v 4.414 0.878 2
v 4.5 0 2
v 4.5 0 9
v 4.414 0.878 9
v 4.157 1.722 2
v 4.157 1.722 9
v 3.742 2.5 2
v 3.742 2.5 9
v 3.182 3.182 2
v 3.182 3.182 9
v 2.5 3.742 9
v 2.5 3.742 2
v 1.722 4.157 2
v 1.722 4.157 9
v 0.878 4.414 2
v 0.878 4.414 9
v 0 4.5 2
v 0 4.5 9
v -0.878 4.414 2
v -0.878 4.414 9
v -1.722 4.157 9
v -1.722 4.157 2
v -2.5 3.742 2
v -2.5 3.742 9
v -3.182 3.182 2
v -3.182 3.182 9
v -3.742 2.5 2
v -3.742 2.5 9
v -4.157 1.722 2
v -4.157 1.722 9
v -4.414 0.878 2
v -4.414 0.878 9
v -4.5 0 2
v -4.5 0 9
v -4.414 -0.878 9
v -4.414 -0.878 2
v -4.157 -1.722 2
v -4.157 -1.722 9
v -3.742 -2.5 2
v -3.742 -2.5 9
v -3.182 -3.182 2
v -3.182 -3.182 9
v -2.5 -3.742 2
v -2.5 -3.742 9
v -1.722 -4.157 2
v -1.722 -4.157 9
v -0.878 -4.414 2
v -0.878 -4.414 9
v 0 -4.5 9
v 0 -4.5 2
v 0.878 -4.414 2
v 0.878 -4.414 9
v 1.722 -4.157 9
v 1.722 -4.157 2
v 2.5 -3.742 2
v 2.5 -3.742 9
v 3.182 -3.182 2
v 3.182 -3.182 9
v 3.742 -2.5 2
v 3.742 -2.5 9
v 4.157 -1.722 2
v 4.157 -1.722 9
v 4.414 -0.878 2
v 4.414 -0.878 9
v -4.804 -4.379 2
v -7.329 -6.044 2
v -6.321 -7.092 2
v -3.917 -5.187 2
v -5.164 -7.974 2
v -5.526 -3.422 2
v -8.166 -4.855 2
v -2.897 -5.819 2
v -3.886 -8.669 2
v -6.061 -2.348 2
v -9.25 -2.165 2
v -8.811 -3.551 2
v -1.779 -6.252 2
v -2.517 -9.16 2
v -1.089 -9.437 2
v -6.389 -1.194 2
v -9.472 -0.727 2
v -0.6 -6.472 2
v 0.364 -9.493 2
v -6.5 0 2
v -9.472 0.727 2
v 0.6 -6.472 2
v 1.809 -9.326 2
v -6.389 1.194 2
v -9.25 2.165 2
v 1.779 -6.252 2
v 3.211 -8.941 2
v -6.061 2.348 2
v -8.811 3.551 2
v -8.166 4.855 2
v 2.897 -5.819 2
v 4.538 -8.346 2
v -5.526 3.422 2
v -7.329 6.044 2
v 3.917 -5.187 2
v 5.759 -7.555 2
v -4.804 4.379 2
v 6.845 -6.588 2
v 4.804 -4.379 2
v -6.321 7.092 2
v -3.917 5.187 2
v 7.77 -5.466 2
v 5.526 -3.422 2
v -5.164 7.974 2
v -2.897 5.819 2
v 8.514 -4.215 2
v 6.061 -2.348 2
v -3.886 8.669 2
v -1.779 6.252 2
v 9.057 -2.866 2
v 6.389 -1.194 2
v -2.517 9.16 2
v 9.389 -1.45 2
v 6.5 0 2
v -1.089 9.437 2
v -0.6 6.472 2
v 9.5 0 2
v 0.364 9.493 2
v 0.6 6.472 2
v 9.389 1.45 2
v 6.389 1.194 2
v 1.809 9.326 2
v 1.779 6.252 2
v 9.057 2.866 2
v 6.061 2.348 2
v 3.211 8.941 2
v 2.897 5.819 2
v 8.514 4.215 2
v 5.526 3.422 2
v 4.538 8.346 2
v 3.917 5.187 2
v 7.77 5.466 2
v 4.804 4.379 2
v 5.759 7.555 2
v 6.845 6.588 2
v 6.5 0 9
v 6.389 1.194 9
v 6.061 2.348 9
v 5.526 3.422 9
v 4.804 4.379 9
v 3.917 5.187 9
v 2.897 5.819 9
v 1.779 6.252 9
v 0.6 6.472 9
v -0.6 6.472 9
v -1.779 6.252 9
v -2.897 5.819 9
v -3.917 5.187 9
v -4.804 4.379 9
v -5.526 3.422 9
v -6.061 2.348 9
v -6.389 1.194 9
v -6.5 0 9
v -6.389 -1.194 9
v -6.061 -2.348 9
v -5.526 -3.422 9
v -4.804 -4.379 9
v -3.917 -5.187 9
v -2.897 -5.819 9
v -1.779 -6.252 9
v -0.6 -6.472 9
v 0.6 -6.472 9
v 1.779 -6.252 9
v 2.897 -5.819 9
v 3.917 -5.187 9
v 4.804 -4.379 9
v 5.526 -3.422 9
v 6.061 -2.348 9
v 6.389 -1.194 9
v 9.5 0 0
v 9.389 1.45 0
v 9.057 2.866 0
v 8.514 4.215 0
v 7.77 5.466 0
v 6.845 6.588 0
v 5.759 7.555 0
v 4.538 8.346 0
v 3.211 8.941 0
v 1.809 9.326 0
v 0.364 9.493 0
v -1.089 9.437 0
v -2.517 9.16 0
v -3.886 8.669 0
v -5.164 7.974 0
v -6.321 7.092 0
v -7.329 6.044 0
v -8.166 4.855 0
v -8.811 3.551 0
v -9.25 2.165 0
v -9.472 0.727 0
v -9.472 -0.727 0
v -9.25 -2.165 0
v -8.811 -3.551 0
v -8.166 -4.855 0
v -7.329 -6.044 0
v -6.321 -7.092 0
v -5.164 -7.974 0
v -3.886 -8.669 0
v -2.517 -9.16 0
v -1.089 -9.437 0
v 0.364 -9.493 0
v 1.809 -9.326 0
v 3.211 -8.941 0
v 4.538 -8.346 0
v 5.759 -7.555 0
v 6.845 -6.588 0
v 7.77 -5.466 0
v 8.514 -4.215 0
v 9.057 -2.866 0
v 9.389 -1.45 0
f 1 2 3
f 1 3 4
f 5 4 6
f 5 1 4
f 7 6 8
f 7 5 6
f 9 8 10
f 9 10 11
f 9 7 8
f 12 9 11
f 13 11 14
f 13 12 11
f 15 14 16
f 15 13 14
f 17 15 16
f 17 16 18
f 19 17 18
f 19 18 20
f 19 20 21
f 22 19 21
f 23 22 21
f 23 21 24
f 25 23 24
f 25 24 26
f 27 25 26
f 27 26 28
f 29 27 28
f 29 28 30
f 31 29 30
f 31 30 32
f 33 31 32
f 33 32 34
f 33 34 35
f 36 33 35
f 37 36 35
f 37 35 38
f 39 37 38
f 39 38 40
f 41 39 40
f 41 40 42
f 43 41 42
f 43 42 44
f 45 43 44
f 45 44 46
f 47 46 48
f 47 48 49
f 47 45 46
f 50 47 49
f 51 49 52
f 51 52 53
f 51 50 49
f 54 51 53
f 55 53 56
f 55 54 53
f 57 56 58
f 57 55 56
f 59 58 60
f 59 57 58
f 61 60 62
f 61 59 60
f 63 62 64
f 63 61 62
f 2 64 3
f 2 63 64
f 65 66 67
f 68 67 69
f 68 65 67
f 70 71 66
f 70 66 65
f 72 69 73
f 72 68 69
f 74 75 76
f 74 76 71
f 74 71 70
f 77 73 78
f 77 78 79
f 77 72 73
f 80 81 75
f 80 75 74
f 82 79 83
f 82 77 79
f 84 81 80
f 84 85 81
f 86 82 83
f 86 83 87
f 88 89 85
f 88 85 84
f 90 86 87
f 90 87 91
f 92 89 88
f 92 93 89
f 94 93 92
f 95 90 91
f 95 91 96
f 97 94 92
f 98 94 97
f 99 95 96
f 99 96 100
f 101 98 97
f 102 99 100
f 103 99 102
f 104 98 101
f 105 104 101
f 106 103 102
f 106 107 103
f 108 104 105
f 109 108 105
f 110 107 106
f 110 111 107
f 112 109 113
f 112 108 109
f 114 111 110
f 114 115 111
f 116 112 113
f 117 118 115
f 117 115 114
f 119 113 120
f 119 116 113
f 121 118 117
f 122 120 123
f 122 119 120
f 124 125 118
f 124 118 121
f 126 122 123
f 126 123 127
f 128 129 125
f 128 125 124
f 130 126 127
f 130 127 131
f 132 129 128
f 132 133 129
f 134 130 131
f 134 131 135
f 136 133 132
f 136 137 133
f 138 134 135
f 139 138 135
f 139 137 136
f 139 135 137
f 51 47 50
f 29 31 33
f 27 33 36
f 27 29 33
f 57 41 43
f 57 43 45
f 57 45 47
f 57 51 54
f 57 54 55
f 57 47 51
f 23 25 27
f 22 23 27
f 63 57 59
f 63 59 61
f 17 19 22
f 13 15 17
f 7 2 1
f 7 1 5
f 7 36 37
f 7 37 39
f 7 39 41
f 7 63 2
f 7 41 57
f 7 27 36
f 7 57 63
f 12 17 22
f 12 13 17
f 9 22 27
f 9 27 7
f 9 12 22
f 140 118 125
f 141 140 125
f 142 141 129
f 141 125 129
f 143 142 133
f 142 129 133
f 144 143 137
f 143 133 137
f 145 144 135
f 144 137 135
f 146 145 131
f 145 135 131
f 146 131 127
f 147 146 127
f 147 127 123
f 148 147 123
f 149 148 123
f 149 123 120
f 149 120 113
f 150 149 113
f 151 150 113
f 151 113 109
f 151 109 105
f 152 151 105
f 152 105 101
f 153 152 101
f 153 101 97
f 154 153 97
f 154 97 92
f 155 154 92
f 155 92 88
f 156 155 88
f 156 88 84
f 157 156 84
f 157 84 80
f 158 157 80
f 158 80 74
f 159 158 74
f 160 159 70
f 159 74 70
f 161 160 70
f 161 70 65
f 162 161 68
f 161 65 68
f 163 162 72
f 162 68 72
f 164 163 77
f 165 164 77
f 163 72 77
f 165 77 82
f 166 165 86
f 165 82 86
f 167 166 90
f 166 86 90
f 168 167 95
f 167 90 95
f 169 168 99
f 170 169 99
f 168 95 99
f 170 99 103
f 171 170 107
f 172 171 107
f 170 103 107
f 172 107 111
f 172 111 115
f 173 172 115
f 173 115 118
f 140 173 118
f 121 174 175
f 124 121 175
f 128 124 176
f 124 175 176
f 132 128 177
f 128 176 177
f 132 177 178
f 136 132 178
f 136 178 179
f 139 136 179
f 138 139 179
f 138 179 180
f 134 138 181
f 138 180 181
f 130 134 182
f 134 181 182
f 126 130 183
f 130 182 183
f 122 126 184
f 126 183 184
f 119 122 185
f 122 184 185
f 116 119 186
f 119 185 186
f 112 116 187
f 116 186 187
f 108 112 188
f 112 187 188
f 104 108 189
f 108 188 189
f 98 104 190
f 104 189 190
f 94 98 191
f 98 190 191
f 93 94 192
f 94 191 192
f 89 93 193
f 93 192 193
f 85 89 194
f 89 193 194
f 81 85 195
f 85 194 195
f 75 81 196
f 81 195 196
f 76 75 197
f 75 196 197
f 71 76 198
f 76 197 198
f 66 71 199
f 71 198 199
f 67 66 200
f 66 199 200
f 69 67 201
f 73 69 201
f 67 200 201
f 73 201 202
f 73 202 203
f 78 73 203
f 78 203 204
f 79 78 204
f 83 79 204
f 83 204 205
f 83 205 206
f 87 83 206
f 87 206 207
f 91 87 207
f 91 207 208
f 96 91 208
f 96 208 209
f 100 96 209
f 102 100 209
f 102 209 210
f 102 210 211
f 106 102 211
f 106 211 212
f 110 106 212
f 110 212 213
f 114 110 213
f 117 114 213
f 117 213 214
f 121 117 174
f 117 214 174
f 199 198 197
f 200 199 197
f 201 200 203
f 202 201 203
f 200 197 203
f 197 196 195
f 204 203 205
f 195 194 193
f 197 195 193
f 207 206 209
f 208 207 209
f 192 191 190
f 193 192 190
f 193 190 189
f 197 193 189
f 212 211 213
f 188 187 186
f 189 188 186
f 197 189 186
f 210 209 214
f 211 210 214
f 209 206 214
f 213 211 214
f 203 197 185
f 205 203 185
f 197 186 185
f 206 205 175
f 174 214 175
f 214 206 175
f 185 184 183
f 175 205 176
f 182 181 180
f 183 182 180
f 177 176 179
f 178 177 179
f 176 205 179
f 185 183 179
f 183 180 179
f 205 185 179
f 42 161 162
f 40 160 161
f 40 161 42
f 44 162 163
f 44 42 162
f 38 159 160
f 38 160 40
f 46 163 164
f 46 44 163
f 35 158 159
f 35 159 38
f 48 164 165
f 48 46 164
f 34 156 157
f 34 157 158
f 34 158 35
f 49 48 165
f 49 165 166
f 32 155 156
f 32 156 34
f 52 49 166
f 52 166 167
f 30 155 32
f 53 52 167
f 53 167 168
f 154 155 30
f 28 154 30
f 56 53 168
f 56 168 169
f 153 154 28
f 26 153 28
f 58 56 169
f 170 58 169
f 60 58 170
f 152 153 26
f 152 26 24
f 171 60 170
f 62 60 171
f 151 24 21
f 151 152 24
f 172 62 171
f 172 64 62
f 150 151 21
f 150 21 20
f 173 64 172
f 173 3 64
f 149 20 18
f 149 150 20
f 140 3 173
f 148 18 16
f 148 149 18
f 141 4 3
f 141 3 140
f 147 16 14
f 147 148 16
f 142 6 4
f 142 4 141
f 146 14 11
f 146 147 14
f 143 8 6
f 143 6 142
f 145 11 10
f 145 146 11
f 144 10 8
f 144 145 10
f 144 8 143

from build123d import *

# Parameters (mm, degrees)
F0_R     = 9.5
F0_R_2   = 6.5
F1_DEPTH = 2
F0_R_3   = 4.5
F2_DEPTH = 9
F3_DEPTH = 2


with BuildPart() as f1:
    # F0 (on Top) → F1 (new body)
    with BuildSketch(Plane.XY):
        Circle(F0_R)
        Circle(F0_R_2, mode=Mode.SUBTRACT)
    extrude(amount=F1_DEPTH)

    # F0 (on Top) → F2 (join)
    with BuildSketch(Plane.XY):
        Circle(F0_R_2)
        Circle(F0_R_3, mode=Mode.SUBTRACT)
    extrude(amount=F2_DEPTH)

    # F0 (on Top) → F3 (join)
    with BuildSketch(Plane.XY):
        Circle(F0_R_3)
    extrude(amount=F3_DEPTH)


solid = f1.part
